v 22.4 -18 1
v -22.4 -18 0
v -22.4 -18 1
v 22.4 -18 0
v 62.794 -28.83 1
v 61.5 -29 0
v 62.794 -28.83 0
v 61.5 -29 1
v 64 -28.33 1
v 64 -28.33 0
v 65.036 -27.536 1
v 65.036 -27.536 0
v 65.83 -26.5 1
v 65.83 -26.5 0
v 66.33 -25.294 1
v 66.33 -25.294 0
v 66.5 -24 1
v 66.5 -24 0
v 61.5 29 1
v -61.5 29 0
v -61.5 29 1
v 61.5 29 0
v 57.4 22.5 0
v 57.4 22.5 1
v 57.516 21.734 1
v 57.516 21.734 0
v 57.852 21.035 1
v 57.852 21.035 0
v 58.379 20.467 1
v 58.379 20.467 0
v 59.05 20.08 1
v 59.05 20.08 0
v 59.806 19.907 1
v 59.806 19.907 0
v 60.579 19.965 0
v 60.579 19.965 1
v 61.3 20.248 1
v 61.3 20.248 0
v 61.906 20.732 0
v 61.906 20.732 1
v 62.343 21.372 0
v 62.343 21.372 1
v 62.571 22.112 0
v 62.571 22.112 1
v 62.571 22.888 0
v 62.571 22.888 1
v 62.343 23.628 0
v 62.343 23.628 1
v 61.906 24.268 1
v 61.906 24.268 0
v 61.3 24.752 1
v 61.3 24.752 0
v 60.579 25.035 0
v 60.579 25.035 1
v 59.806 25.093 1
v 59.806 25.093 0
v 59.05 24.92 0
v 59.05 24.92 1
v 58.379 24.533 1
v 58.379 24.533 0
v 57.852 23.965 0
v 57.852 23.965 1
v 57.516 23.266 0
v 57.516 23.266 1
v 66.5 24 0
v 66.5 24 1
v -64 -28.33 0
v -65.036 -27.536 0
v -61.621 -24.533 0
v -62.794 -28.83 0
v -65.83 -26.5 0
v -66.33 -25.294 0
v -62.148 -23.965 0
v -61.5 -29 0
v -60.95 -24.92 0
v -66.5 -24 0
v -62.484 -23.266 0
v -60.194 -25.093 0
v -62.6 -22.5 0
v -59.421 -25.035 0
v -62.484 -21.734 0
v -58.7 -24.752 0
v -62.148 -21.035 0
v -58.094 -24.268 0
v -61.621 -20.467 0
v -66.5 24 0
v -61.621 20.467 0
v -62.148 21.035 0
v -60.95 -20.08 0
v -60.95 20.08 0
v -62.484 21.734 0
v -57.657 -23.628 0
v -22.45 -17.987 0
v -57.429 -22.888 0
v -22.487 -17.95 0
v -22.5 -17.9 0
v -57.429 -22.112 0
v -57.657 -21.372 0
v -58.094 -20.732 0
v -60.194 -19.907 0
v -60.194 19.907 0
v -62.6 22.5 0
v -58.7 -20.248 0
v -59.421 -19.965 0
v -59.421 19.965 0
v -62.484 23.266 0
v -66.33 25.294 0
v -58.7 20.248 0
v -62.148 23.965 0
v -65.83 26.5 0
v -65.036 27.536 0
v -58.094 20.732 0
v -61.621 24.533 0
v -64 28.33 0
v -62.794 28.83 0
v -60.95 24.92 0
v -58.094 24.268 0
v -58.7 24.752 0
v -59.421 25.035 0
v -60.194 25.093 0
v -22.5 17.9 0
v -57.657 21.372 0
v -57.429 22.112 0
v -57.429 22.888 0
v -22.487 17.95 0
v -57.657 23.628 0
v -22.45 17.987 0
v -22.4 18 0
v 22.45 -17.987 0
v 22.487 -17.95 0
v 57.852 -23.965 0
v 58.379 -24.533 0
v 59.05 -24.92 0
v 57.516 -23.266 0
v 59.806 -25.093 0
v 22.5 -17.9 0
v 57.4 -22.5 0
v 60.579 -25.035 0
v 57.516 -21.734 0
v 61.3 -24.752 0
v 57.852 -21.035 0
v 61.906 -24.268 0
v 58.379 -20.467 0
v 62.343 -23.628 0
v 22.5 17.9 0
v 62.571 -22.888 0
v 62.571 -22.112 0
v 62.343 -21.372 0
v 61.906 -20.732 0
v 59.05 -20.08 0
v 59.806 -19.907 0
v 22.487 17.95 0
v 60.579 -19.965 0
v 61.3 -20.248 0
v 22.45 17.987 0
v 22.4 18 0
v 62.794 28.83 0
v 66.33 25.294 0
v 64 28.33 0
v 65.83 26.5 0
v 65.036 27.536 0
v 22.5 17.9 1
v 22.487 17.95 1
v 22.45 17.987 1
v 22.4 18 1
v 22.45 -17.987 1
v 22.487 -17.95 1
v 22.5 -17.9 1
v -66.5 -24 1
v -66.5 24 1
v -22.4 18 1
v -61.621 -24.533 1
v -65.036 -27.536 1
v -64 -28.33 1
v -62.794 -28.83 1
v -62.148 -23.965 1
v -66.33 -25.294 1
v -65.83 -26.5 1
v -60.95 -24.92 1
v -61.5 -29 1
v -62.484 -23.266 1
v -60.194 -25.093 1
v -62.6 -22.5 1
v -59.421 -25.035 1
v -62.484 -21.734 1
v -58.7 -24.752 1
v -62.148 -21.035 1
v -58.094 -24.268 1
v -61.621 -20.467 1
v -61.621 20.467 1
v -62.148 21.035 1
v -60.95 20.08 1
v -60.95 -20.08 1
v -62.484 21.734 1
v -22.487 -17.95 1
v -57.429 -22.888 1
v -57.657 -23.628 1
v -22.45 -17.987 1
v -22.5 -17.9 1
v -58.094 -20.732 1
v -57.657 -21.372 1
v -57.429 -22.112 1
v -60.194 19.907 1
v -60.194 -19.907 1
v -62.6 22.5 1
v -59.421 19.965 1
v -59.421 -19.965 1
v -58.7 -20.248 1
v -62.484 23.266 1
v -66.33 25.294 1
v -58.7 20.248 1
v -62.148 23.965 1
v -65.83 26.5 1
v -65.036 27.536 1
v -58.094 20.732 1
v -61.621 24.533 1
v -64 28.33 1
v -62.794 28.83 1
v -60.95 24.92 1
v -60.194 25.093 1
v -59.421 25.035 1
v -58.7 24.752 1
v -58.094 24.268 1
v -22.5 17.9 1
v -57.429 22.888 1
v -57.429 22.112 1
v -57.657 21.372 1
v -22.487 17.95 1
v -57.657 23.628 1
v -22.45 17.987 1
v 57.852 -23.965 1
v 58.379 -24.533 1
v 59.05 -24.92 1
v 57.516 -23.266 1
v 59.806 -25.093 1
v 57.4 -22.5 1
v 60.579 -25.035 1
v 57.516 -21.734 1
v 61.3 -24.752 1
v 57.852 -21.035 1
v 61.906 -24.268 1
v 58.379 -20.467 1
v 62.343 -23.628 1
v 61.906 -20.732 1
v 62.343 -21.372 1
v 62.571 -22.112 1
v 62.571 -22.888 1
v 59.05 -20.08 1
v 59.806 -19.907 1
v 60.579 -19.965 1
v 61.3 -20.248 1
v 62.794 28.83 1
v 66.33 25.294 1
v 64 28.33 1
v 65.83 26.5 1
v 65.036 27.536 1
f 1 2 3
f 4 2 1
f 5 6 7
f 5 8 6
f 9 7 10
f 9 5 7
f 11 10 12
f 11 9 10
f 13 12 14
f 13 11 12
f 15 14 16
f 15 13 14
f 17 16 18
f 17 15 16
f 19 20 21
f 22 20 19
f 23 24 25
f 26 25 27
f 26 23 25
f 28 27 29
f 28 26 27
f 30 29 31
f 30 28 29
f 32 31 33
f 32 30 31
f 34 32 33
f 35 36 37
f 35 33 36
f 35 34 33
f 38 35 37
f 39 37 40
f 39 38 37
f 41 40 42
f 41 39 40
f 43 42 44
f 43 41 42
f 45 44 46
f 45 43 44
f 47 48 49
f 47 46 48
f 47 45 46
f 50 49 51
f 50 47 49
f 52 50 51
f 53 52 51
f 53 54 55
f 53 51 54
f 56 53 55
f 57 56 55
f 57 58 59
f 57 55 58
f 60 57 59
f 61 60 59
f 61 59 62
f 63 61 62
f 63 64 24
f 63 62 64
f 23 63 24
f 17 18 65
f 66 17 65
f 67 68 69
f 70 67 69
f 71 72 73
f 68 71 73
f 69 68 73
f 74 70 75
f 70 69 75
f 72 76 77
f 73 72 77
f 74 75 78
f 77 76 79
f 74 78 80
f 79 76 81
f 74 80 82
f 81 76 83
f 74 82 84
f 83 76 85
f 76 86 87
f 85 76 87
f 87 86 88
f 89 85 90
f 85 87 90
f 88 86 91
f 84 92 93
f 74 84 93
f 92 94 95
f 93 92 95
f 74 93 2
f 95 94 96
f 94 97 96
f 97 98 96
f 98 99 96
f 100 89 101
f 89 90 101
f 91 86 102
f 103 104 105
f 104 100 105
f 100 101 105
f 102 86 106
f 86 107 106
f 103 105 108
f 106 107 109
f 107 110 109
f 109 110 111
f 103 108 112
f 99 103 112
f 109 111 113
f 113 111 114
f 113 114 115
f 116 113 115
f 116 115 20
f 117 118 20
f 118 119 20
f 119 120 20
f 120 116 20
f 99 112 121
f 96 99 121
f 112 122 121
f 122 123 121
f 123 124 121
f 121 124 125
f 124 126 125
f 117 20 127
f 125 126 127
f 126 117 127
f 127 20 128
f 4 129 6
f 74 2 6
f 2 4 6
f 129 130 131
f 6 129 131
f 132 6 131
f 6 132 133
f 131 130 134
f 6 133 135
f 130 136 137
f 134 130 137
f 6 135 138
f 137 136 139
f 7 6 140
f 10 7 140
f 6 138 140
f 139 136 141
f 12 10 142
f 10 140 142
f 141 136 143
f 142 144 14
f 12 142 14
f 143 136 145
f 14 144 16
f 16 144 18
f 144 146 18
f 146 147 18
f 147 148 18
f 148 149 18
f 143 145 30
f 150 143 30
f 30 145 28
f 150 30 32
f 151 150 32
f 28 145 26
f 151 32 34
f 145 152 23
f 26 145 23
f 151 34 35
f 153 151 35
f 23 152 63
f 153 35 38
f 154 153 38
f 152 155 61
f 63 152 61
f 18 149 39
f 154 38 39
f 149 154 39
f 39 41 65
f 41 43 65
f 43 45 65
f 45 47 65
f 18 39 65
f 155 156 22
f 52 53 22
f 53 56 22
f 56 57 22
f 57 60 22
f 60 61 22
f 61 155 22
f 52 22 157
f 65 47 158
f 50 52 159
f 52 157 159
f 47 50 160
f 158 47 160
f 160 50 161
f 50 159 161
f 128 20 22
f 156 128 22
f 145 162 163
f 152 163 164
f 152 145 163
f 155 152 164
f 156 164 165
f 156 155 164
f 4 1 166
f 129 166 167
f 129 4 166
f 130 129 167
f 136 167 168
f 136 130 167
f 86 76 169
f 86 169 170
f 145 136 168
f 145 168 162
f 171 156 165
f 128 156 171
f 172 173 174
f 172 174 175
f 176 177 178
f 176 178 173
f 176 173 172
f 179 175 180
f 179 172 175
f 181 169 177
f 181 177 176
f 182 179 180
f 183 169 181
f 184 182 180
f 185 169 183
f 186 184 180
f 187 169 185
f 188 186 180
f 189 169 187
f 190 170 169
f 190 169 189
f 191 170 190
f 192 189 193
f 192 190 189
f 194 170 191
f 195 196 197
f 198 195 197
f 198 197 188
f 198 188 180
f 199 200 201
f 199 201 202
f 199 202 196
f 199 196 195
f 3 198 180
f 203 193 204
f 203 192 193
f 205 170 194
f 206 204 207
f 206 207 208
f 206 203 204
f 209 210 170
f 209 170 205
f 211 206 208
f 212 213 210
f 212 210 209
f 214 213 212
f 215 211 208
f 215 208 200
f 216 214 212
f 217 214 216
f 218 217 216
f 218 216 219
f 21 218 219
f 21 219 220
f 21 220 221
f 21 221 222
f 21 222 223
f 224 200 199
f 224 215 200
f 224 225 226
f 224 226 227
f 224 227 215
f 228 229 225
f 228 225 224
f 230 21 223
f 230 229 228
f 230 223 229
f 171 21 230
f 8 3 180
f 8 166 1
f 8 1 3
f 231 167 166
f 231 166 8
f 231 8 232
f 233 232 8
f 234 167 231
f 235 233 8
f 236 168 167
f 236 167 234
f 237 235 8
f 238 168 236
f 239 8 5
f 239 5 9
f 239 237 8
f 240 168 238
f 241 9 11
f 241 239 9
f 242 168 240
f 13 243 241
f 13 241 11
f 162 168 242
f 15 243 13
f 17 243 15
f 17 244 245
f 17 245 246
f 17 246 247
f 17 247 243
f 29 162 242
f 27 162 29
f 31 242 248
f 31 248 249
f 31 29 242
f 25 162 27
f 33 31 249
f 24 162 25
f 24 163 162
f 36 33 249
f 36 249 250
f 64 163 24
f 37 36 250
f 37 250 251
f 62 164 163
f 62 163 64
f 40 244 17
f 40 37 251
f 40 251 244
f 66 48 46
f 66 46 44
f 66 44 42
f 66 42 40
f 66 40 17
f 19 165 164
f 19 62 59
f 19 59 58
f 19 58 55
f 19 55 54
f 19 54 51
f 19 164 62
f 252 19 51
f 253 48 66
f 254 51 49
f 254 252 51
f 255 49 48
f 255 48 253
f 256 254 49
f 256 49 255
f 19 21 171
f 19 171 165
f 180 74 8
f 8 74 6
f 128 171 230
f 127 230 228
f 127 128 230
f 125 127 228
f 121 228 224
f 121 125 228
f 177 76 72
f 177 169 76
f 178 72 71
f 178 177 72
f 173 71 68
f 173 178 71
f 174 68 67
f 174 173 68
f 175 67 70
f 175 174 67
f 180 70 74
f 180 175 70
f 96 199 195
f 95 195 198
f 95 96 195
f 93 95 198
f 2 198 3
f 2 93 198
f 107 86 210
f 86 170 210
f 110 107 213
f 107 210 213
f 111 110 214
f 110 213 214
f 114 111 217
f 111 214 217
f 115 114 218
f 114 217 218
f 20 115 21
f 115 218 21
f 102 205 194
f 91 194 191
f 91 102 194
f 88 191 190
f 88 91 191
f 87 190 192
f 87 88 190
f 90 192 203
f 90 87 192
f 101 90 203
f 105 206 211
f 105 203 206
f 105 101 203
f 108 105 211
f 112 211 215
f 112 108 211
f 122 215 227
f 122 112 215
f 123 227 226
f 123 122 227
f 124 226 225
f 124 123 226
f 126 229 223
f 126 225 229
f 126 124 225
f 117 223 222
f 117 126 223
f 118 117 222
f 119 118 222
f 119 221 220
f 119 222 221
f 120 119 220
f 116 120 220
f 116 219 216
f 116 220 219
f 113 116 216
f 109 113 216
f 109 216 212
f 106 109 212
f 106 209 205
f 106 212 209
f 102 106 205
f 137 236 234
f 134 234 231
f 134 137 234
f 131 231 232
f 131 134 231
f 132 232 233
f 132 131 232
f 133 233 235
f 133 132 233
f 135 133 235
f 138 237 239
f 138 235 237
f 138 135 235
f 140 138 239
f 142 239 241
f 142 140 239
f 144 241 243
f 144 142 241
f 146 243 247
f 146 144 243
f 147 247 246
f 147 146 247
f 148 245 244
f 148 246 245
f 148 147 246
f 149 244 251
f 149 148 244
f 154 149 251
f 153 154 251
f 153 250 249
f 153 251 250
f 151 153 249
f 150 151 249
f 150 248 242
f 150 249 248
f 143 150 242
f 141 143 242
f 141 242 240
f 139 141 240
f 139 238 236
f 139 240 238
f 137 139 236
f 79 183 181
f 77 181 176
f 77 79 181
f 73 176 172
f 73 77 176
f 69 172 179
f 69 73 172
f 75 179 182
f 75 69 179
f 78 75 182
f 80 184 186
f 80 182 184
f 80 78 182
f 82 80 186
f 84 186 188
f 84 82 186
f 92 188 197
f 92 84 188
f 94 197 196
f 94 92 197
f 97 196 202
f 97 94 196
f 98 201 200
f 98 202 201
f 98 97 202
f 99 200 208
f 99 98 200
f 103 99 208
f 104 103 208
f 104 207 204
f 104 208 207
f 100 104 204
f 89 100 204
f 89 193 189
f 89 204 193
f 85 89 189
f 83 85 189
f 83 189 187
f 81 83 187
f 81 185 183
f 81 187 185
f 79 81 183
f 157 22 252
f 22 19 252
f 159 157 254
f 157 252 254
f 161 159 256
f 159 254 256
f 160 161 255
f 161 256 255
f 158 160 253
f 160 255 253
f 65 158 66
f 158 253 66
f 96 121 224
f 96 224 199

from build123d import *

# Parameters (mm, degrees)
SKETCH1_W           = 133
SKETCH1_H           = 58
BOSS_EXTRUDE1_DEPTH = 1
CUT_EXTRUDE1_REACH  = 74.555
FILLET1_R           = 5
CUT_EXTRUDE2_REACH  = 74.555
SKETCH3_R           = 2.6


with BuildPart() as part:
    # Sketch1 → Boss-Extrude1 (new body)
    with BuildSketch(Plane.XY):
        Rectangle(SKETCH1_W, SKETCH1_H)
    extrude(amount=BOSS_EXTRUDE1_DEPTH)

    # Sketch2 → Cut-Extrude1 (cut, up to next)
    with BuildSketch(Plane.XY, mode=Mode.PRIVATE) as cut_extrude1_sk1:
        with BuildLine():
            Line((-22.4, -18), (22.4, -18))
            ThreePointArc((22.4, -18), (22.470710678, -17.970710678), (22.5, -17.9))
            Line((22.5, -17.9), (22.5, 17.9))
            ThreePointArc((22.5, 17.9), (22.470710678, 17.970710678), (22.4, 18))
            Line((22.4, 18), (-22.4, 18))
            ThreePointArc((-22.4, 18), (-22.470710678, 17.970710678), (-22.5, 17.9))
            Line((-22.5, 17.9), (-22.5, -17.9))
            ThreePointArc((-22.5, -17.9), (-22.470710678, -17.970710678), (-22.4, -18))
        make_face()
    cut_extrude1_tool1 = extrude(cut_extrude1_sk1.sketch, amount=CUT_EXTRUDE1_REACH, mode=Mode.PRIVATE) & part.part
    add(cut_extrude1_tool1.solids().sort_by_distance((0, 0, 0))[0], mode=Mode.SUBTRACT)

    # Fillet1
    fillet1_edges = [part.edges().sort_by_distance(p)[0] for p in [
        (66.5, -29, 0.5),
        (-66.5, -29, 0.5),
        (-66.5, 29, 0.5),
        (66.5, 29, 0.5),
    ]]
    fillet(fillet1_edges, radius=FILLET1_R)

    # Sketch3 → Cut-Extrude2 (cut, up to next)
    with BuildSketch(Plane.XY, mode=Mode.PRIVATE) as cut_extrude2_sk1:
        with Locations(Location((-60, 22.5, 0), (0, 0, 180))):
            Circle(SKETCH3_R)
    cut_extrude2_tool1 = extrude(cut_extrude2_sk1.sketch, amount=CUT_EXTRUDE2_REACH, mode=Mode.PRIVATE) & part.part
    # Sketch3 → Cut-Extrude2 (cut, up to next)
    with BuildSketch(Plane.XY, mode=Mode.PRIVATE) as cut_extrude2_sk2:
        with Locations(Location((60, 22.5, 0), (0, 0, 180))):
            Circle(SKETCH3_R)
    cut_extrude2_tool2 = extrude(cut_extrude2_sk2.sketch, amount=CUT_EXTRUDE2_REACH, mode=Mode.PRIVATE) & part.part
    # Sketch3 → Cut-Extrude2 (cut, up to next)
    with BuildSketch(Plane.XY, mode=Mode.PRIVATE) as cut_extrude2_sk3:
        with Locations(Location((60, -22.5, 0), (0, 0, 180))):
            Circle(SKETCH3_R)
    cut_extrude2_tool3 = extrude(cut_extrude2_sk3.sketch, amount=CUT_EXTRUDE2_REACH, mode=Mode.PRIVATE) & part.part
    # Sketch3 → Cut-Extrude2 (cut, up to next)
    with BuildSketch(Plane.XY, mode=Mode.PRIVATE) as cut_extrude2_sk4:
        with Locations(Location((-60, -22.5, 0), (0, 0, 180))):
            Circle(SKETCH3_R)
    cut_extrude2_tool4 = extrude(cut_extrude2_sk4.sketch, amount=CUT_EXTRUDE2_REACH, mode=Mode.PRIVATE) & part.part
    add(cut_extrude2_tool1.solids().sort_by_distance((-60, 22.5, 0))[0], mode=Mode.SUBTRACT)
    add(cut_extrude2_tool2.solids().sort_by_distance((60, 22.5, 0))[0], mode=Mode.SUBTRACT)
    add(cut_extrude2_tool3.solids().sort_by_distance((60, -22.5, 0))[0], mode=Mode.SUBTRACT)
    add(cut_extrude2_tool4.solids().sort_by_distance((-60, -22.5, 0))[0], mode=Mode.SUBTRACT)


solid = part.part
